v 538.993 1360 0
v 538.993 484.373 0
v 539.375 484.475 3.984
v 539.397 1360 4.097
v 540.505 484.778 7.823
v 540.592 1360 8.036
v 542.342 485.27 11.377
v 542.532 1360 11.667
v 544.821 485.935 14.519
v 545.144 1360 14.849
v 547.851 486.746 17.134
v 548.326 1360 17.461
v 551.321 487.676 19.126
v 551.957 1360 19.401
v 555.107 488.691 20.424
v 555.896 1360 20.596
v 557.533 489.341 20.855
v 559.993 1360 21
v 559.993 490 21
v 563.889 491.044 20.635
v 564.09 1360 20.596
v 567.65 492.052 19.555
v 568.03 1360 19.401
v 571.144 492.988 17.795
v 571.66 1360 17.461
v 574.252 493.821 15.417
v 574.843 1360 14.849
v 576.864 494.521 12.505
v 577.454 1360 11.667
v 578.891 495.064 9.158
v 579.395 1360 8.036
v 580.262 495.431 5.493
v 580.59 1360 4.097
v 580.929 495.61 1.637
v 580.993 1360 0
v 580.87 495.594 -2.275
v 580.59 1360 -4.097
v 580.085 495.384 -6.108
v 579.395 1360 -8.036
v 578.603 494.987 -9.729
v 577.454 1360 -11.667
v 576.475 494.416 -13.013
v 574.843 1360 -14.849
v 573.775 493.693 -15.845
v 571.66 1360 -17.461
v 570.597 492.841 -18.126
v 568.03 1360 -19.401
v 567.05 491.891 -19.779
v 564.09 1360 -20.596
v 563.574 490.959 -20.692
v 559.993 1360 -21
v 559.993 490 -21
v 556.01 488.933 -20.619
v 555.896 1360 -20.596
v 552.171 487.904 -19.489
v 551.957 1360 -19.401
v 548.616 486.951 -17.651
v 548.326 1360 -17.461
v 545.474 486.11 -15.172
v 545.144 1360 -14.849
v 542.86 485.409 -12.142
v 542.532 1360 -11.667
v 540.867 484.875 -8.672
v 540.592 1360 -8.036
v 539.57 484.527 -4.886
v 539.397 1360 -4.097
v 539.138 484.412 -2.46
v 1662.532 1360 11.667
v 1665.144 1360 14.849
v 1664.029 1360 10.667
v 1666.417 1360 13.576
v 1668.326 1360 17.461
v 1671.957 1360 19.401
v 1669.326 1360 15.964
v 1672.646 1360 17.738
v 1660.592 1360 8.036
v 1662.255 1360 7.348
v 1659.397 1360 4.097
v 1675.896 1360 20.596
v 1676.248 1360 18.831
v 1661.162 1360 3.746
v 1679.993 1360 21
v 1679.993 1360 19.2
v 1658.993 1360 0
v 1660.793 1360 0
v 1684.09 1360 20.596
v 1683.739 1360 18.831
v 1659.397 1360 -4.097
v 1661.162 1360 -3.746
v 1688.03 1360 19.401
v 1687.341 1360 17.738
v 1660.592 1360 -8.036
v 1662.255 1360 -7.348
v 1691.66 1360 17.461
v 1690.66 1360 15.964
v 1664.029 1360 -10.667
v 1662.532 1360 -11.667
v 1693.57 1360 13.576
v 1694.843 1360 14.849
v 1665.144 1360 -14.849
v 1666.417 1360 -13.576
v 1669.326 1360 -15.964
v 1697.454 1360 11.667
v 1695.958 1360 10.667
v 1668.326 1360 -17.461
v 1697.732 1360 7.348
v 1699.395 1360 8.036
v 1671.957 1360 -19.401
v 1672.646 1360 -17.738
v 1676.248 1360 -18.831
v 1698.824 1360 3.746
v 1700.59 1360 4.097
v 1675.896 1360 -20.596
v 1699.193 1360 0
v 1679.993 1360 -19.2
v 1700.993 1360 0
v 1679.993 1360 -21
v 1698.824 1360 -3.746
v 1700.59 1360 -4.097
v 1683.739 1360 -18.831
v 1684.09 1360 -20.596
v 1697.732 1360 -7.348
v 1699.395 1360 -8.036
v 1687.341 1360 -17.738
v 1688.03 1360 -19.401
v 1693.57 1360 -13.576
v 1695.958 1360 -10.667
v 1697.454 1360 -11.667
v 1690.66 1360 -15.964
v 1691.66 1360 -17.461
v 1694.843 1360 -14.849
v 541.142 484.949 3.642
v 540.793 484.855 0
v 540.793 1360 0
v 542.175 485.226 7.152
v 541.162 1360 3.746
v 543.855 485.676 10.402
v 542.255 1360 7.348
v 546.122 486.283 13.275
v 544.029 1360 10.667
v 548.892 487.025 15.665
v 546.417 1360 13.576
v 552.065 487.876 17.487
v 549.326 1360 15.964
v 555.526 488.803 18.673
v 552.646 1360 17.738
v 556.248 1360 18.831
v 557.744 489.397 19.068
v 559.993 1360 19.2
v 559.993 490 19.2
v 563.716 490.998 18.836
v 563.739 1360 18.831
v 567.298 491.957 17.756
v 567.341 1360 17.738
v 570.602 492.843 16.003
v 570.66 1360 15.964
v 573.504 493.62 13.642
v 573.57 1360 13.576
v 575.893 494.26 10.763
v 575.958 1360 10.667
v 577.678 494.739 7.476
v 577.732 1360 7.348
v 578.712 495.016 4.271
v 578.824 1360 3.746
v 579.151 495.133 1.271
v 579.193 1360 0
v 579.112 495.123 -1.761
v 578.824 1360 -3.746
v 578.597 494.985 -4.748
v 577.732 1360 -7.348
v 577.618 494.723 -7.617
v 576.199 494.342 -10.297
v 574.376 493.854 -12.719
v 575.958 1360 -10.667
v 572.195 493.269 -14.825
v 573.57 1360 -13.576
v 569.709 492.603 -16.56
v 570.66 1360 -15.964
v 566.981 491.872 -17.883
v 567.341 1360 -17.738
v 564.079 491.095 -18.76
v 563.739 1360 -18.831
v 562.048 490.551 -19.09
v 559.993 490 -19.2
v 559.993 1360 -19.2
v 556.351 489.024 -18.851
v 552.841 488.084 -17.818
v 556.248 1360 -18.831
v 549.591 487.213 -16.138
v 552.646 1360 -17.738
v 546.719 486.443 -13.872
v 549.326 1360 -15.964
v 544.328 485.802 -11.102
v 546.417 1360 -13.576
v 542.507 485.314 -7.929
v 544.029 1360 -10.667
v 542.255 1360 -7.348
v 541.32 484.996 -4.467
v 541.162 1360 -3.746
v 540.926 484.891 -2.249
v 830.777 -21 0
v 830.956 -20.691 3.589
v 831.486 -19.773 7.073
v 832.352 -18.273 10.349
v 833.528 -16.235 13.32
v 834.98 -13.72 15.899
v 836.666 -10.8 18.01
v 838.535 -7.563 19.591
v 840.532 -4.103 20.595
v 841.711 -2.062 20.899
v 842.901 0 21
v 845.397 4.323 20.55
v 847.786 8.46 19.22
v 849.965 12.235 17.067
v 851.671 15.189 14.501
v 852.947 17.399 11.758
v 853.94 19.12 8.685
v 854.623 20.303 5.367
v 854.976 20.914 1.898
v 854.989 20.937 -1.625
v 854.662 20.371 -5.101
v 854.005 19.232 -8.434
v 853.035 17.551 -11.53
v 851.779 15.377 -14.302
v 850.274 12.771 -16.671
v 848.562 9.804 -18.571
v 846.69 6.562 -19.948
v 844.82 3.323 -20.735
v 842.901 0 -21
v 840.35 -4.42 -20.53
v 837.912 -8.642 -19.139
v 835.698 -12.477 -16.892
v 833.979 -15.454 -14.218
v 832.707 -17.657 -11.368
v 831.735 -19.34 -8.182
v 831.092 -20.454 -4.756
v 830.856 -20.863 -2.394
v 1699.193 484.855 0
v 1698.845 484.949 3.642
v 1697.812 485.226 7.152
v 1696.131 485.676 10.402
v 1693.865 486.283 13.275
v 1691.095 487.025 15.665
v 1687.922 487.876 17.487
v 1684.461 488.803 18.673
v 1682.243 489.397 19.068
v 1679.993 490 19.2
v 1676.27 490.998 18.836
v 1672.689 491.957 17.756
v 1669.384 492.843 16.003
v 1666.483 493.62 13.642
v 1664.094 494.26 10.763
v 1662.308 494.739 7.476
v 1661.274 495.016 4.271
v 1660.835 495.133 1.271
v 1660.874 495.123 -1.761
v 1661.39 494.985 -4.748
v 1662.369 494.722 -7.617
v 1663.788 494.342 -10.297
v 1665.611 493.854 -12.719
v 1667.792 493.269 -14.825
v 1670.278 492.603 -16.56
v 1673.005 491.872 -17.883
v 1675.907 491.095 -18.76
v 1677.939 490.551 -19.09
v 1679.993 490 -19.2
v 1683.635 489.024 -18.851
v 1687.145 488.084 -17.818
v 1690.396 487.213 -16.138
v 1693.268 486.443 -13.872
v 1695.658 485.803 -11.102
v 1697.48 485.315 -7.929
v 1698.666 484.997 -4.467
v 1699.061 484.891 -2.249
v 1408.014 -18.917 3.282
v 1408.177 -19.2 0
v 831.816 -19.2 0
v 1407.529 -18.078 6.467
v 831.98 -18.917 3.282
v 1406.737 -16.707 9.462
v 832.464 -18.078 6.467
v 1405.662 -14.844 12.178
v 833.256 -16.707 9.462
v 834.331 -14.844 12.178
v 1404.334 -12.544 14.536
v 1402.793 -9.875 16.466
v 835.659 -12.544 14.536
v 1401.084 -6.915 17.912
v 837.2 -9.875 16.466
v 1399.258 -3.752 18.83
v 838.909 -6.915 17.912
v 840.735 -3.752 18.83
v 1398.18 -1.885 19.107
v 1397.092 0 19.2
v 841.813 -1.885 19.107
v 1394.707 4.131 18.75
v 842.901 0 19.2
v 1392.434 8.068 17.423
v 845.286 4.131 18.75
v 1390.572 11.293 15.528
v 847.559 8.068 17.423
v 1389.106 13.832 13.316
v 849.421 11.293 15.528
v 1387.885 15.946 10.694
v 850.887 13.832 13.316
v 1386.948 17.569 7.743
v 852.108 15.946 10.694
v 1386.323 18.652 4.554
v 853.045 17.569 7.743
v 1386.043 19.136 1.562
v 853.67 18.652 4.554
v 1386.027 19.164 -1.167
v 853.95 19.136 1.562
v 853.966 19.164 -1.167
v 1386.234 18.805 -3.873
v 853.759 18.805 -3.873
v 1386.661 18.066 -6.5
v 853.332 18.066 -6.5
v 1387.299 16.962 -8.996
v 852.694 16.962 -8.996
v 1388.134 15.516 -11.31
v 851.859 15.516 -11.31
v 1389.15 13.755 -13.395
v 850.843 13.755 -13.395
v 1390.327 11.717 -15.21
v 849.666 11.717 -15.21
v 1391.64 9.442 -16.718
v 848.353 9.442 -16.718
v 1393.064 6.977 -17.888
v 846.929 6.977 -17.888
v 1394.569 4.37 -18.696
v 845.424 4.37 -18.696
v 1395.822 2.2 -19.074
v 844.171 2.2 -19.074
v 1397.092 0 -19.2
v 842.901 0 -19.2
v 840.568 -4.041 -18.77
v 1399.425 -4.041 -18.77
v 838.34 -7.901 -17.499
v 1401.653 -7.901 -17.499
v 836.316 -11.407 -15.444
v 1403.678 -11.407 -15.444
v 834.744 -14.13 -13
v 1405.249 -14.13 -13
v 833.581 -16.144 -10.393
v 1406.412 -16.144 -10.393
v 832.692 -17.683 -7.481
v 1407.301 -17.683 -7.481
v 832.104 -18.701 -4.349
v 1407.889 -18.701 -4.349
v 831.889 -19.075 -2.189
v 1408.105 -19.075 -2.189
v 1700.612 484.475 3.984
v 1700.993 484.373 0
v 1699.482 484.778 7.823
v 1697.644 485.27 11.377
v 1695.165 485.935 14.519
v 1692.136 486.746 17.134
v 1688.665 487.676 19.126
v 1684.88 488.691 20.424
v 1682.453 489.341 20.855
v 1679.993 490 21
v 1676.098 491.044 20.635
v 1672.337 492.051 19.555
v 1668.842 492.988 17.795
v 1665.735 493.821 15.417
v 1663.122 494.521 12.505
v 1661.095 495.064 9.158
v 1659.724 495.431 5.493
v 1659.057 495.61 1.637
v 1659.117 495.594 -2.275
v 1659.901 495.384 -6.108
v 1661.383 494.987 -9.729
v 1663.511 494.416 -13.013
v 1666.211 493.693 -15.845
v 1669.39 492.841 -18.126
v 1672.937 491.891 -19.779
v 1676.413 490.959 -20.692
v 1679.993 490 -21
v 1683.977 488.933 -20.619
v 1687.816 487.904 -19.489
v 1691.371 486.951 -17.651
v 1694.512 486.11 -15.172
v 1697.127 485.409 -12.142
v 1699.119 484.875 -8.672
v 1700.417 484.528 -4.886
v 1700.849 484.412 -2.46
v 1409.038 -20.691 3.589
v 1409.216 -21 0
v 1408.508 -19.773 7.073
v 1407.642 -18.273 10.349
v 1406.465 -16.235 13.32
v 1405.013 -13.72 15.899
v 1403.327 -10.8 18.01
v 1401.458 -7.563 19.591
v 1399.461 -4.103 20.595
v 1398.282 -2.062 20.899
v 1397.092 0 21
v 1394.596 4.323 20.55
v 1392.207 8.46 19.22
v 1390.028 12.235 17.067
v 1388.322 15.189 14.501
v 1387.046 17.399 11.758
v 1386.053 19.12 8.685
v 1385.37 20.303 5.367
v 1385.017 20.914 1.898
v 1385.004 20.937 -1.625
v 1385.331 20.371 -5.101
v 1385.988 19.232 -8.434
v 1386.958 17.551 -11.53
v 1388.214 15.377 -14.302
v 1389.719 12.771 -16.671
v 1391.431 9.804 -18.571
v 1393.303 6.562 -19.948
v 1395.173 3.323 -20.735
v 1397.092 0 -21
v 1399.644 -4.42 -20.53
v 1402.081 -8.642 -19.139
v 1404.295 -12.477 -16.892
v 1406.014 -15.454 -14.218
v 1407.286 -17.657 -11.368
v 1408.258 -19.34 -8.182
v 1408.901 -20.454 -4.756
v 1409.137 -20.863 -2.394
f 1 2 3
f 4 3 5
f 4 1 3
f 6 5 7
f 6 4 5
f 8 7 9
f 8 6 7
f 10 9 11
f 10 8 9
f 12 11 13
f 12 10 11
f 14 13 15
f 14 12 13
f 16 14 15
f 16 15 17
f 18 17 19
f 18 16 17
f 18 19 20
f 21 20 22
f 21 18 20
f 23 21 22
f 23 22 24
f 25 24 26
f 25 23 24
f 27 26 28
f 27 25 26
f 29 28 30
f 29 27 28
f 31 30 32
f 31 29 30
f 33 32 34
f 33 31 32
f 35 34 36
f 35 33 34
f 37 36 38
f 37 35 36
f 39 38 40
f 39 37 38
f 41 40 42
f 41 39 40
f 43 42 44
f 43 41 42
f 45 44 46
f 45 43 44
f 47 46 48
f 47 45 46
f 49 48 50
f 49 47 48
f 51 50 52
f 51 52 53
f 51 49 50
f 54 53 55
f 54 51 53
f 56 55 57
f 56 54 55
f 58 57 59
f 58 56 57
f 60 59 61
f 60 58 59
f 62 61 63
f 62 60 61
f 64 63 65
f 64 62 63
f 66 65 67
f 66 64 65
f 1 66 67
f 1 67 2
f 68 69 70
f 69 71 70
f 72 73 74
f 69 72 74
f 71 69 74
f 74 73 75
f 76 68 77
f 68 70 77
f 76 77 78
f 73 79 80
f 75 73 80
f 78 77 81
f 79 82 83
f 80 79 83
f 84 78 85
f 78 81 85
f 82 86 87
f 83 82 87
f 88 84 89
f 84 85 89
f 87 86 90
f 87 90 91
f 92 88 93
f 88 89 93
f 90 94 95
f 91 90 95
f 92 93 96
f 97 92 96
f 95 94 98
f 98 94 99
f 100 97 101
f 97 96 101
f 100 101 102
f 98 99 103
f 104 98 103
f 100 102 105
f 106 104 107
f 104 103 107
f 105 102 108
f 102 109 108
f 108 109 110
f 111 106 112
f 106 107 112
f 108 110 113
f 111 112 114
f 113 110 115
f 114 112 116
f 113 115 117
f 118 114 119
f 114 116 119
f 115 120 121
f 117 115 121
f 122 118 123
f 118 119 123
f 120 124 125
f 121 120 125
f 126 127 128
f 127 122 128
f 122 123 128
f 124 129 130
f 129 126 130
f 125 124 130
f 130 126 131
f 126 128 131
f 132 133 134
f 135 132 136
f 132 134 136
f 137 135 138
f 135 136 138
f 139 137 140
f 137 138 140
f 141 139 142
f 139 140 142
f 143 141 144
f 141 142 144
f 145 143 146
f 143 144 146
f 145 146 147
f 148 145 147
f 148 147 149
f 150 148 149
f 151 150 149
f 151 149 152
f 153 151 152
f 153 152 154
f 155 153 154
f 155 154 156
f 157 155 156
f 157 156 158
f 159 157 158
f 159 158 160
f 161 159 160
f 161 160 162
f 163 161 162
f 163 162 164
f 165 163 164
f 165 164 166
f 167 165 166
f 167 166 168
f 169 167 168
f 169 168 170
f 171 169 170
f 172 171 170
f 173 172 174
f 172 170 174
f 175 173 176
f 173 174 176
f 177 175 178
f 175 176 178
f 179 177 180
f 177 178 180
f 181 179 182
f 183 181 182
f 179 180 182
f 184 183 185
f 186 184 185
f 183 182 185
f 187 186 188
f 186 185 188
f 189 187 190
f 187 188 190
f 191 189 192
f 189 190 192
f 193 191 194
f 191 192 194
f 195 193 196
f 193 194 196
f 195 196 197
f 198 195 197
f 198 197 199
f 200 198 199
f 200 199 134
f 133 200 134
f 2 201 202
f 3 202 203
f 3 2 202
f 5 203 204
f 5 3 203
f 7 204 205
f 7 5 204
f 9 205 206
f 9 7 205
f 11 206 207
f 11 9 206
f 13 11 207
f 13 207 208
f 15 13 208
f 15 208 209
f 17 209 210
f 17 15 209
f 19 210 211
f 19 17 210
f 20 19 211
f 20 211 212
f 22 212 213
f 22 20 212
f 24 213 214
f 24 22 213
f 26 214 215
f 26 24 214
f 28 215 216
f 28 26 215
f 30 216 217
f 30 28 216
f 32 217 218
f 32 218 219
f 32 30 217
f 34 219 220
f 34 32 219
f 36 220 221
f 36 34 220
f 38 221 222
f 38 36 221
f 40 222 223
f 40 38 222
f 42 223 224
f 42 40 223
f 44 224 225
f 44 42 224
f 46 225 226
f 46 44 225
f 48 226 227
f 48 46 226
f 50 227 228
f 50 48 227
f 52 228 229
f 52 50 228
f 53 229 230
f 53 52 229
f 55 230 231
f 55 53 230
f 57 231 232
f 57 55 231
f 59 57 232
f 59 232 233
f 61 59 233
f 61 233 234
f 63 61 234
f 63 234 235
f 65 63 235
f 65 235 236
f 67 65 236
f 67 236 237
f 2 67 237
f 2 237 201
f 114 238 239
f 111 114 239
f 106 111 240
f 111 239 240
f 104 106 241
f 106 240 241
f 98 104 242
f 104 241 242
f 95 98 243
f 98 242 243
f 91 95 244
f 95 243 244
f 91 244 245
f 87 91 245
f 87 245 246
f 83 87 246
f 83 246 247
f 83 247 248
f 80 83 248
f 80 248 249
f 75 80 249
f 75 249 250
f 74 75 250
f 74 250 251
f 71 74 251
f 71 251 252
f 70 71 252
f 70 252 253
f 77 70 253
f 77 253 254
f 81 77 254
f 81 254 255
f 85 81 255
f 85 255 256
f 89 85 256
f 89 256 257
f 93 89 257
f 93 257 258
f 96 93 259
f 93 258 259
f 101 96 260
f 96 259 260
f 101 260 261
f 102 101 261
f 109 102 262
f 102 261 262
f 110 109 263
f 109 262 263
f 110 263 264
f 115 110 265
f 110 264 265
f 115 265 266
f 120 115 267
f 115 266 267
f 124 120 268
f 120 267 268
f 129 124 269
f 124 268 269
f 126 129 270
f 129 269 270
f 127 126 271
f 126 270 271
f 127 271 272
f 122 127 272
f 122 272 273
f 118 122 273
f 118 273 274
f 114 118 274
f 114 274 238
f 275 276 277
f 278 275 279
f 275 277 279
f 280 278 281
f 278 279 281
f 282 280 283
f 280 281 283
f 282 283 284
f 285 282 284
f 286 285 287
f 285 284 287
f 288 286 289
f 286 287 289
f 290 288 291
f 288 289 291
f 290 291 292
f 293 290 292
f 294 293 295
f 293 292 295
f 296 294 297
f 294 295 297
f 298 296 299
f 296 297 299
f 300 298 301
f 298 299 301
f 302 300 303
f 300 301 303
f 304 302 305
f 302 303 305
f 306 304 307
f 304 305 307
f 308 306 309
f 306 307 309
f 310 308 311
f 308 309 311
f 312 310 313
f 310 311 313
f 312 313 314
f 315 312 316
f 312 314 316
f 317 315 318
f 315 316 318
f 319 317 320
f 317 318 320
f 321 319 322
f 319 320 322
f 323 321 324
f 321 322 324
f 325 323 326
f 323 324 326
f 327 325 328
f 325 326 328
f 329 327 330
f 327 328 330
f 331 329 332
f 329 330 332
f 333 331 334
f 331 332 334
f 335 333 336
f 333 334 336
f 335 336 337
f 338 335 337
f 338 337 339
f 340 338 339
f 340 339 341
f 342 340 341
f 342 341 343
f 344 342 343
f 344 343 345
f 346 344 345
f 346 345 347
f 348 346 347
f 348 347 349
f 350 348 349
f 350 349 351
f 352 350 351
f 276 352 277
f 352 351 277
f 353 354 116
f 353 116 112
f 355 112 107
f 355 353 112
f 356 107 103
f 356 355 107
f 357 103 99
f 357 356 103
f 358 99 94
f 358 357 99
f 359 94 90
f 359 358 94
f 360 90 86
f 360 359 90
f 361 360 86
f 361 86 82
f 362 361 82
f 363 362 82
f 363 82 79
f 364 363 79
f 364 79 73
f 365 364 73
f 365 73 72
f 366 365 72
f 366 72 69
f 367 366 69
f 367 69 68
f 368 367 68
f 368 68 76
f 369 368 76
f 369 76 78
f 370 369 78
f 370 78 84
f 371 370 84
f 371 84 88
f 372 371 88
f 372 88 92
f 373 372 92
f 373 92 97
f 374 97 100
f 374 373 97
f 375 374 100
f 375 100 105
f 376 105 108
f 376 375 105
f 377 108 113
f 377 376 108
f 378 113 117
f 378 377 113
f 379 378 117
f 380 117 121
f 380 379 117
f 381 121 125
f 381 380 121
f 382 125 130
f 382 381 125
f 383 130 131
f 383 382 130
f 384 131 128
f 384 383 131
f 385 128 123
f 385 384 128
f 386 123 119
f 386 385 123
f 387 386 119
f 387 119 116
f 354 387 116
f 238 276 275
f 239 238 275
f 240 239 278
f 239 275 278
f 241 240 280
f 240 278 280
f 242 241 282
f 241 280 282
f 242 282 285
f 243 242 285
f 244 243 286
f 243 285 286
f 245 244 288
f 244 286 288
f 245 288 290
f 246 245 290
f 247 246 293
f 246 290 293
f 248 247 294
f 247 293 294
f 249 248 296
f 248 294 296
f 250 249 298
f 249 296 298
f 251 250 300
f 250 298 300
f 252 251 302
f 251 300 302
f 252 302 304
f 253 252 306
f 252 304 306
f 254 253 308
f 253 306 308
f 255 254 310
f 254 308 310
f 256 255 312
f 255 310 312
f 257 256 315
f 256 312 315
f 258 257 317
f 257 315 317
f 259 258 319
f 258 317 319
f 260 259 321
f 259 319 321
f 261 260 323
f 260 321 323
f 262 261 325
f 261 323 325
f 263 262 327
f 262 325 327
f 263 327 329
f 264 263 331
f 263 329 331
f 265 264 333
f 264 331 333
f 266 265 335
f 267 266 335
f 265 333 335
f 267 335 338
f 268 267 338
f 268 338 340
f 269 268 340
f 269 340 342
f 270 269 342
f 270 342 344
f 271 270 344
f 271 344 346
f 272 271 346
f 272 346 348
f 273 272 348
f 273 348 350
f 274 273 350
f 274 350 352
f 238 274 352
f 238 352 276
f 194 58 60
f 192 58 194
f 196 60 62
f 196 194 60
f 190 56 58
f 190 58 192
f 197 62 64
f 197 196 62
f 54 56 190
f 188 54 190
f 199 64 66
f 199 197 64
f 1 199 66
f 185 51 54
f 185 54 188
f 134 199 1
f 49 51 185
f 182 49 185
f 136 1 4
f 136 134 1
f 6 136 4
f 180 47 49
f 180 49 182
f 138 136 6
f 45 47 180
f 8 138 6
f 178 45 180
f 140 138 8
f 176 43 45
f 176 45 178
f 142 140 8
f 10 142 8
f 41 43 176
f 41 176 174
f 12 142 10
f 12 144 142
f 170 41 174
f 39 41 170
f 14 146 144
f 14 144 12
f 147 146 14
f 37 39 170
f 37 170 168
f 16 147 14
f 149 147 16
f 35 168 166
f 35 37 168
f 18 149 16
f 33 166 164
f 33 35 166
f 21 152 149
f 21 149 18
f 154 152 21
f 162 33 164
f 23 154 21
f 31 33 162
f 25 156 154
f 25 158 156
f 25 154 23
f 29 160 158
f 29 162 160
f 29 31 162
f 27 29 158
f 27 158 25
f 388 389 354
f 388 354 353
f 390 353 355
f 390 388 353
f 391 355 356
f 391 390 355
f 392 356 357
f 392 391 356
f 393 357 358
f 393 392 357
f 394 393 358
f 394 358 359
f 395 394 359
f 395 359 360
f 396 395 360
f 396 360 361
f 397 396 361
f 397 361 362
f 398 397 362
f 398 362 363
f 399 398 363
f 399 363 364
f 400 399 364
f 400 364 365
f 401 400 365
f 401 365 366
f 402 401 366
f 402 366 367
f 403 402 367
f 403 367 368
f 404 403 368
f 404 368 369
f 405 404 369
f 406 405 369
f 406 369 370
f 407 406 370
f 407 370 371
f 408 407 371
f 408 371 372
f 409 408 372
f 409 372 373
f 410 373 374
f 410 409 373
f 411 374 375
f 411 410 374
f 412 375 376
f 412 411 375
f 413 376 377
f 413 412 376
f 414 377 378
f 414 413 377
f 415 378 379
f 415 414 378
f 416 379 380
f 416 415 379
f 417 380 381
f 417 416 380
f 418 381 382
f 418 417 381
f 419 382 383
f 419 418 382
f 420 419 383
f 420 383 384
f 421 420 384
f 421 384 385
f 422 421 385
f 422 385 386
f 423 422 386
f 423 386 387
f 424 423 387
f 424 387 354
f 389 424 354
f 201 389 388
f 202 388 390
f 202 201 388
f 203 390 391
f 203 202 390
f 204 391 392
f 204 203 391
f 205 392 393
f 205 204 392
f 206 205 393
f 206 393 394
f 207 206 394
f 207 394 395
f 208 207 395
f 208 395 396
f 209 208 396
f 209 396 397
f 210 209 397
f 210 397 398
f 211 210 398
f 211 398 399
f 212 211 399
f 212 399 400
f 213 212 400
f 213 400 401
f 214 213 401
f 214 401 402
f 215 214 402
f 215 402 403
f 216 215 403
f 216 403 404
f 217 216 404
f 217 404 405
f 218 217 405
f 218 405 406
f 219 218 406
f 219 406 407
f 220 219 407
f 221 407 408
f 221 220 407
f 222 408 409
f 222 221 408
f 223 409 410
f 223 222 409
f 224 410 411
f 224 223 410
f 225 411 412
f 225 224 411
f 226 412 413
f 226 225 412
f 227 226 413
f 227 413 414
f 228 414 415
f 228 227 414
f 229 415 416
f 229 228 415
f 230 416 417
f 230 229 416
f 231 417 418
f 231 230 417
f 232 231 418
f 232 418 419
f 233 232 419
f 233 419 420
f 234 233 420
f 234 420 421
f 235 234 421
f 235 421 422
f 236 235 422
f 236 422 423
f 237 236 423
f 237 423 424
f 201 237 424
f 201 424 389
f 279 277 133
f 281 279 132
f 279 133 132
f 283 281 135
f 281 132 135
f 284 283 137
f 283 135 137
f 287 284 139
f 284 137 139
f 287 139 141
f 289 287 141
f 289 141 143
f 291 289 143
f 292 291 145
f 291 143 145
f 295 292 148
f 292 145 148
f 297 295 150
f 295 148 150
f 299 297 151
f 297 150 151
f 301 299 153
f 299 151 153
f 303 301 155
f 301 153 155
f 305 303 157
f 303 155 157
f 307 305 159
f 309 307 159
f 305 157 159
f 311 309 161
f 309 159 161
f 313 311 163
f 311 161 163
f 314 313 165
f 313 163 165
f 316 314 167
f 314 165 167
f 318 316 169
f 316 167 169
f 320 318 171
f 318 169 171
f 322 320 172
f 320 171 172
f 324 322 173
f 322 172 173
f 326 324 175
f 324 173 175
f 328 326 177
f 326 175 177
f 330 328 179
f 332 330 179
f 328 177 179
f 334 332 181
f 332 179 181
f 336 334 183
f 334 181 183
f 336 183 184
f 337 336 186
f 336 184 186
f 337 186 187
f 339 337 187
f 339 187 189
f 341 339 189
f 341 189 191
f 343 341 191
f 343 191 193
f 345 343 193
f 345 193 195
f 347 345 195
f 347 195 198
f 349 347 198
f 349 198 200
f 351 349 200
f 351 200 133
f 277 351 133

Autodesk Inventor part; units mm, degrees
ref_plane "YZ Plane" through (0, 0, 0) normal (1, 0, 0) x (0, 1, 0)
ref_plane "XZ Plane" through (0, 0, 0) normal (0, 1, 0) x (-1, 0, 0)
sketch "Boceto1" plane through (0, 0, 0) normal (0, 0, 1) x (1, 0, 0)
  line L0 (-332.0752, 0) -> (-331.8519, -0.5171)
  line L1 (560.0067, 1140) -> (559.9933, 1139.483)
  line L2 (332.0752, 0) -> (331.8519, -0.5171)
  line L3 (559.9933, 488.7901) -> (559.9933, 1360)
  line L4 (559.9933, 1360) -> (565.6963, 1360)
  line L5 (1679.9933, 1360) -> (1679.9933, 490)
  line L6 (1397.0917, 0) -> (842.9014, 0)
  line L7 (559.9933, 490) -> (559.9933, 1360)
  line L8 (-277.7918, 0) -> (-277.7902, -0.0027)
  line L9 (1679.9933, 1360) -> (1679.9933, 1303.9992)
  line L10 (1679.9933, 1360) -> (1679.9933, 490)
  line L11 (1679.9933, 490) -> (1397.0917, 0)
  line L12 (559.9933, 1360) -> (559.9933, 490)
  line L13 (559.9933, 490) -> (842.9014, 0)
  point P0 (0, 0)
  point P1 (0, -20)
  point P2 (277.7902, 0)
ref_plane "Plano de trabajo6" through (1679.9933, 1360, 0) normal (0, -1, 0) x (1, 0, 0)
sketch "Boceto7" plane through (1679.9933, 1360, 0) normal (0, -1, 0) x (1, 0, 0)
  circle A0 centre (0, 0) radius 21
  circle A1 centre (0, 0) radius 19.2
  point P0 (-1679.9933, 0)
  dimension "d32" = 42
  dimension "d33" = 38.4
sweep "Barrido3" add profiles "Boceto7" path "Boceto1" path curves L5 L11 L6 L13 L12
properties part number "barra_palanca" material "Acero, carbono"
